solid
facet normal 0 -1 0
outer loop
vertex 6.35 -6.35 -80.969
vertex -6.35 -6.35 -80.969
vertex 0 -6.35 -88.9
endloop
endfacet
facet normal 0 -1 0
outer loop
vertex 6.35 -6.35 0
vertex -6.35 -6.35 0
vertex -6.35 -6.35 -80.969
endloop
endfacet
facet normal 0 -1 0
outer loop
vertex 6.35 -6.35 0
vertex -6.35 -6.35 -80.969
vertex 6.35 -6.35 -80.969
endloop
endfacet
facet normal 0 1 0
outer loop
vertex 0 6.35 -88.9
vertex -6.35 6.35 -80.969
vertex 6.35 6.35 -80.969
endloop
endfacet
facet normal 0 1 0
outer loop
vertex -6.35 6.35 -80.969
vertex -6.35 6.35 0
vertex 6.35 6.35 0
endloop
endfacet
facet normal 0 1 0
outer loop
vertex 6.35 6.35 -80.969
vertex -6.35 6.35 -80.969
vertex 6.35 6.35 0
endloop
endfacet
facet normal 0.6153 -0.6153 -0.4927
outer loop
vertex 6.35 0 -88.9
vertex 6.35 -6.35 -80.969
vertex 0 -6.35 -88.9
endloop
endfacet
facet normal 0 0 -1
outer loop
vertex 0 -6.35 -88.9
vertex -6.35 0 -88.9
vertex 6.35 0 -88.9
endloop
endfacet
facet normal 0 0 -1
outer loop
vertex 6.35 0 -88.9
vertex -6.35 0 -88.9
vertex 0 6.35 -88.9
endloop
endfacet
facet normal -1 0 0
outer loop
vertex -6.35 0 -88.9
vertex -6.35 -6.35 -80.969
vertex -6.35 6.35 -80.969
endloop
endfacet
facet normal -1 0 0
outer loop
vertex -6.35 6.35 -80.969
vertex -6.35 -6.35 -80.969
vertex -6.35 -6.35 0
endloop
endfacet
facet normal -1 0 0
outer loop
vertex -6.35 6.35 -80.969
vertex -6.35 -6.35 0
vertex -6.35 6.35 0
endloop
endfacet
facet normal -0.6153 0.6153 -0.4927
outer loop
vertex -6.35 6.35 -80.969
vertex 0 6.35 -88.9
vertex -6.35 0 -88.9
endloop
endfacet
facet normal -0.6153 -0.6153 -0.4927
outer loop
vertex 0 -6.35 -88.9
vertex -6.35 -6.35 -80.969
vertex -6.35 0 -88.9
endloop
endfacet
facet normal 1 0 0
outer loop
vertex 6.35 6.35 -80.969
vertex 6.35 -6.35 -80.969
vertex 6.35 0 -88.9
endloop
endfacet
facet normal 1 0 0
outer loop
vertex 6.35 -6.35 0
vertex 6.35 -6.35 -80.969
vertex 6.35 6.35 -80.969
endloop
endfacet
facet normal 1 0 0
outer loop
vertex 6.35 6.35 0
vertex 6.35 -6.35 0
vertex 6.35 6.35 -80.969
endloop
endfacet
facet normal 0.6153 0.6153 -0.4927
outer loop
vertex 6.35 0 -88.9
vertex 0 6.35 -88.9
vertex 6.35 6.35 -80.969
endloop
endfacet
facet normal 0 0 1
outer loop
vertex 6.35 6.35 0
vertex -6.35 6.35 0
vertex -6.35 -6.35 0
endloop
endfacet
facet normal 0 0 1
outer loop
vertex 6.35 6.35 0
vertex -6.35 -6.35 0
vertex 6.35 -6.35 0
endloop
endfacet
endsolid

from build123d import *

# Parameters (mm, degrees)
F0_W      = 12.7
F0_H      = 12.7
F1_DEPTH  = 88.9
F15_DEPTH = 25.4
F16_DEPTH = 25.4
F17_DEPTH = 25.4
F18_DEPTH = 25.4


with BuildPart() as f1:
    # F0 (on Top) → F1 (new body)
    with BuildSketch(Plane.XY):
        Rectangle(F0_W, F0_H)
    extrude(amount=-F1_DEPTH)

    # F11 (on 3pt) → F15 (cut)
    with BuildSketch(Plane(origin=(-29.3548700028, 29.3548700028, -23.5027056937), x_dir=(-0.7882634225, -0.4803480231, 0.3845862106), z_dir=(-0.615337937, 0.615337937, -0.4926646391))):
        Polygon((-29.1842413909, -69.3975402572), (-29.1842413909, -59.2375402572), (-37.2399240707, -65.4287902572), align=None)
    extrude(amount=F15_DEPTH, mode=Mode.SUBTRACT)

    # F12 (on 3pt) → F16 (cut)
    with BuildSketch(Plane(origin=(-29.3548700028, -29.3548700028, -23.5027056937), x_dir=(0.7882634225, -0.4803480231, -0.3845862106), z_dir=(-0.615337937, -0.615337937, -0.4926646391))):
        Polygon((37.2399240707, -65.4287902572), (29.1842413909, -59.2375402572), (29.1842413909, -69.3975402572), align=None)
    extrude(amount=F16_DEPTH, mode=Mode.SUBTRACT)

    # F13 (on 3pt) → F17 (cut)
    with BuildSketch(Plane(origin=(29.3548700028, -29.3548700028, -23.5027056937), x_dir=(-0.7882634225, -0.4803480231, -0.3845862106), z_dir=(-0.615337937, 0.615337937, 0.4926646391))):
        Polygon((29.1842413909, -59.2375402572), (29.1842413909, -69.3975402572), (37.2399240707, -65.4287902572), align=None)
    extrude(amount=-F17_DEPTH, mode=Mode.SUBTRACT)

    # F14 (on 3pt) → F18 (cut)
    with BuildSketch(Plane(origin=(29.3548700028, 29.3548700028, -23.5027056937), x_dir=(0.7882634225, -0.4803480231, 0.3845862106), z_dir=(-0.615337937, -0.615337937, 0.4926646391))):
        Polygon((-29.1842413909, -69.3975402572), (-29.1842413909, -59.2375402572), (-37.2399240707, -65.4287902572), align=None)
    extrude(amount=-F18_DEPTH, mode=Mode.SUBTRACT)


solid = f1.part
